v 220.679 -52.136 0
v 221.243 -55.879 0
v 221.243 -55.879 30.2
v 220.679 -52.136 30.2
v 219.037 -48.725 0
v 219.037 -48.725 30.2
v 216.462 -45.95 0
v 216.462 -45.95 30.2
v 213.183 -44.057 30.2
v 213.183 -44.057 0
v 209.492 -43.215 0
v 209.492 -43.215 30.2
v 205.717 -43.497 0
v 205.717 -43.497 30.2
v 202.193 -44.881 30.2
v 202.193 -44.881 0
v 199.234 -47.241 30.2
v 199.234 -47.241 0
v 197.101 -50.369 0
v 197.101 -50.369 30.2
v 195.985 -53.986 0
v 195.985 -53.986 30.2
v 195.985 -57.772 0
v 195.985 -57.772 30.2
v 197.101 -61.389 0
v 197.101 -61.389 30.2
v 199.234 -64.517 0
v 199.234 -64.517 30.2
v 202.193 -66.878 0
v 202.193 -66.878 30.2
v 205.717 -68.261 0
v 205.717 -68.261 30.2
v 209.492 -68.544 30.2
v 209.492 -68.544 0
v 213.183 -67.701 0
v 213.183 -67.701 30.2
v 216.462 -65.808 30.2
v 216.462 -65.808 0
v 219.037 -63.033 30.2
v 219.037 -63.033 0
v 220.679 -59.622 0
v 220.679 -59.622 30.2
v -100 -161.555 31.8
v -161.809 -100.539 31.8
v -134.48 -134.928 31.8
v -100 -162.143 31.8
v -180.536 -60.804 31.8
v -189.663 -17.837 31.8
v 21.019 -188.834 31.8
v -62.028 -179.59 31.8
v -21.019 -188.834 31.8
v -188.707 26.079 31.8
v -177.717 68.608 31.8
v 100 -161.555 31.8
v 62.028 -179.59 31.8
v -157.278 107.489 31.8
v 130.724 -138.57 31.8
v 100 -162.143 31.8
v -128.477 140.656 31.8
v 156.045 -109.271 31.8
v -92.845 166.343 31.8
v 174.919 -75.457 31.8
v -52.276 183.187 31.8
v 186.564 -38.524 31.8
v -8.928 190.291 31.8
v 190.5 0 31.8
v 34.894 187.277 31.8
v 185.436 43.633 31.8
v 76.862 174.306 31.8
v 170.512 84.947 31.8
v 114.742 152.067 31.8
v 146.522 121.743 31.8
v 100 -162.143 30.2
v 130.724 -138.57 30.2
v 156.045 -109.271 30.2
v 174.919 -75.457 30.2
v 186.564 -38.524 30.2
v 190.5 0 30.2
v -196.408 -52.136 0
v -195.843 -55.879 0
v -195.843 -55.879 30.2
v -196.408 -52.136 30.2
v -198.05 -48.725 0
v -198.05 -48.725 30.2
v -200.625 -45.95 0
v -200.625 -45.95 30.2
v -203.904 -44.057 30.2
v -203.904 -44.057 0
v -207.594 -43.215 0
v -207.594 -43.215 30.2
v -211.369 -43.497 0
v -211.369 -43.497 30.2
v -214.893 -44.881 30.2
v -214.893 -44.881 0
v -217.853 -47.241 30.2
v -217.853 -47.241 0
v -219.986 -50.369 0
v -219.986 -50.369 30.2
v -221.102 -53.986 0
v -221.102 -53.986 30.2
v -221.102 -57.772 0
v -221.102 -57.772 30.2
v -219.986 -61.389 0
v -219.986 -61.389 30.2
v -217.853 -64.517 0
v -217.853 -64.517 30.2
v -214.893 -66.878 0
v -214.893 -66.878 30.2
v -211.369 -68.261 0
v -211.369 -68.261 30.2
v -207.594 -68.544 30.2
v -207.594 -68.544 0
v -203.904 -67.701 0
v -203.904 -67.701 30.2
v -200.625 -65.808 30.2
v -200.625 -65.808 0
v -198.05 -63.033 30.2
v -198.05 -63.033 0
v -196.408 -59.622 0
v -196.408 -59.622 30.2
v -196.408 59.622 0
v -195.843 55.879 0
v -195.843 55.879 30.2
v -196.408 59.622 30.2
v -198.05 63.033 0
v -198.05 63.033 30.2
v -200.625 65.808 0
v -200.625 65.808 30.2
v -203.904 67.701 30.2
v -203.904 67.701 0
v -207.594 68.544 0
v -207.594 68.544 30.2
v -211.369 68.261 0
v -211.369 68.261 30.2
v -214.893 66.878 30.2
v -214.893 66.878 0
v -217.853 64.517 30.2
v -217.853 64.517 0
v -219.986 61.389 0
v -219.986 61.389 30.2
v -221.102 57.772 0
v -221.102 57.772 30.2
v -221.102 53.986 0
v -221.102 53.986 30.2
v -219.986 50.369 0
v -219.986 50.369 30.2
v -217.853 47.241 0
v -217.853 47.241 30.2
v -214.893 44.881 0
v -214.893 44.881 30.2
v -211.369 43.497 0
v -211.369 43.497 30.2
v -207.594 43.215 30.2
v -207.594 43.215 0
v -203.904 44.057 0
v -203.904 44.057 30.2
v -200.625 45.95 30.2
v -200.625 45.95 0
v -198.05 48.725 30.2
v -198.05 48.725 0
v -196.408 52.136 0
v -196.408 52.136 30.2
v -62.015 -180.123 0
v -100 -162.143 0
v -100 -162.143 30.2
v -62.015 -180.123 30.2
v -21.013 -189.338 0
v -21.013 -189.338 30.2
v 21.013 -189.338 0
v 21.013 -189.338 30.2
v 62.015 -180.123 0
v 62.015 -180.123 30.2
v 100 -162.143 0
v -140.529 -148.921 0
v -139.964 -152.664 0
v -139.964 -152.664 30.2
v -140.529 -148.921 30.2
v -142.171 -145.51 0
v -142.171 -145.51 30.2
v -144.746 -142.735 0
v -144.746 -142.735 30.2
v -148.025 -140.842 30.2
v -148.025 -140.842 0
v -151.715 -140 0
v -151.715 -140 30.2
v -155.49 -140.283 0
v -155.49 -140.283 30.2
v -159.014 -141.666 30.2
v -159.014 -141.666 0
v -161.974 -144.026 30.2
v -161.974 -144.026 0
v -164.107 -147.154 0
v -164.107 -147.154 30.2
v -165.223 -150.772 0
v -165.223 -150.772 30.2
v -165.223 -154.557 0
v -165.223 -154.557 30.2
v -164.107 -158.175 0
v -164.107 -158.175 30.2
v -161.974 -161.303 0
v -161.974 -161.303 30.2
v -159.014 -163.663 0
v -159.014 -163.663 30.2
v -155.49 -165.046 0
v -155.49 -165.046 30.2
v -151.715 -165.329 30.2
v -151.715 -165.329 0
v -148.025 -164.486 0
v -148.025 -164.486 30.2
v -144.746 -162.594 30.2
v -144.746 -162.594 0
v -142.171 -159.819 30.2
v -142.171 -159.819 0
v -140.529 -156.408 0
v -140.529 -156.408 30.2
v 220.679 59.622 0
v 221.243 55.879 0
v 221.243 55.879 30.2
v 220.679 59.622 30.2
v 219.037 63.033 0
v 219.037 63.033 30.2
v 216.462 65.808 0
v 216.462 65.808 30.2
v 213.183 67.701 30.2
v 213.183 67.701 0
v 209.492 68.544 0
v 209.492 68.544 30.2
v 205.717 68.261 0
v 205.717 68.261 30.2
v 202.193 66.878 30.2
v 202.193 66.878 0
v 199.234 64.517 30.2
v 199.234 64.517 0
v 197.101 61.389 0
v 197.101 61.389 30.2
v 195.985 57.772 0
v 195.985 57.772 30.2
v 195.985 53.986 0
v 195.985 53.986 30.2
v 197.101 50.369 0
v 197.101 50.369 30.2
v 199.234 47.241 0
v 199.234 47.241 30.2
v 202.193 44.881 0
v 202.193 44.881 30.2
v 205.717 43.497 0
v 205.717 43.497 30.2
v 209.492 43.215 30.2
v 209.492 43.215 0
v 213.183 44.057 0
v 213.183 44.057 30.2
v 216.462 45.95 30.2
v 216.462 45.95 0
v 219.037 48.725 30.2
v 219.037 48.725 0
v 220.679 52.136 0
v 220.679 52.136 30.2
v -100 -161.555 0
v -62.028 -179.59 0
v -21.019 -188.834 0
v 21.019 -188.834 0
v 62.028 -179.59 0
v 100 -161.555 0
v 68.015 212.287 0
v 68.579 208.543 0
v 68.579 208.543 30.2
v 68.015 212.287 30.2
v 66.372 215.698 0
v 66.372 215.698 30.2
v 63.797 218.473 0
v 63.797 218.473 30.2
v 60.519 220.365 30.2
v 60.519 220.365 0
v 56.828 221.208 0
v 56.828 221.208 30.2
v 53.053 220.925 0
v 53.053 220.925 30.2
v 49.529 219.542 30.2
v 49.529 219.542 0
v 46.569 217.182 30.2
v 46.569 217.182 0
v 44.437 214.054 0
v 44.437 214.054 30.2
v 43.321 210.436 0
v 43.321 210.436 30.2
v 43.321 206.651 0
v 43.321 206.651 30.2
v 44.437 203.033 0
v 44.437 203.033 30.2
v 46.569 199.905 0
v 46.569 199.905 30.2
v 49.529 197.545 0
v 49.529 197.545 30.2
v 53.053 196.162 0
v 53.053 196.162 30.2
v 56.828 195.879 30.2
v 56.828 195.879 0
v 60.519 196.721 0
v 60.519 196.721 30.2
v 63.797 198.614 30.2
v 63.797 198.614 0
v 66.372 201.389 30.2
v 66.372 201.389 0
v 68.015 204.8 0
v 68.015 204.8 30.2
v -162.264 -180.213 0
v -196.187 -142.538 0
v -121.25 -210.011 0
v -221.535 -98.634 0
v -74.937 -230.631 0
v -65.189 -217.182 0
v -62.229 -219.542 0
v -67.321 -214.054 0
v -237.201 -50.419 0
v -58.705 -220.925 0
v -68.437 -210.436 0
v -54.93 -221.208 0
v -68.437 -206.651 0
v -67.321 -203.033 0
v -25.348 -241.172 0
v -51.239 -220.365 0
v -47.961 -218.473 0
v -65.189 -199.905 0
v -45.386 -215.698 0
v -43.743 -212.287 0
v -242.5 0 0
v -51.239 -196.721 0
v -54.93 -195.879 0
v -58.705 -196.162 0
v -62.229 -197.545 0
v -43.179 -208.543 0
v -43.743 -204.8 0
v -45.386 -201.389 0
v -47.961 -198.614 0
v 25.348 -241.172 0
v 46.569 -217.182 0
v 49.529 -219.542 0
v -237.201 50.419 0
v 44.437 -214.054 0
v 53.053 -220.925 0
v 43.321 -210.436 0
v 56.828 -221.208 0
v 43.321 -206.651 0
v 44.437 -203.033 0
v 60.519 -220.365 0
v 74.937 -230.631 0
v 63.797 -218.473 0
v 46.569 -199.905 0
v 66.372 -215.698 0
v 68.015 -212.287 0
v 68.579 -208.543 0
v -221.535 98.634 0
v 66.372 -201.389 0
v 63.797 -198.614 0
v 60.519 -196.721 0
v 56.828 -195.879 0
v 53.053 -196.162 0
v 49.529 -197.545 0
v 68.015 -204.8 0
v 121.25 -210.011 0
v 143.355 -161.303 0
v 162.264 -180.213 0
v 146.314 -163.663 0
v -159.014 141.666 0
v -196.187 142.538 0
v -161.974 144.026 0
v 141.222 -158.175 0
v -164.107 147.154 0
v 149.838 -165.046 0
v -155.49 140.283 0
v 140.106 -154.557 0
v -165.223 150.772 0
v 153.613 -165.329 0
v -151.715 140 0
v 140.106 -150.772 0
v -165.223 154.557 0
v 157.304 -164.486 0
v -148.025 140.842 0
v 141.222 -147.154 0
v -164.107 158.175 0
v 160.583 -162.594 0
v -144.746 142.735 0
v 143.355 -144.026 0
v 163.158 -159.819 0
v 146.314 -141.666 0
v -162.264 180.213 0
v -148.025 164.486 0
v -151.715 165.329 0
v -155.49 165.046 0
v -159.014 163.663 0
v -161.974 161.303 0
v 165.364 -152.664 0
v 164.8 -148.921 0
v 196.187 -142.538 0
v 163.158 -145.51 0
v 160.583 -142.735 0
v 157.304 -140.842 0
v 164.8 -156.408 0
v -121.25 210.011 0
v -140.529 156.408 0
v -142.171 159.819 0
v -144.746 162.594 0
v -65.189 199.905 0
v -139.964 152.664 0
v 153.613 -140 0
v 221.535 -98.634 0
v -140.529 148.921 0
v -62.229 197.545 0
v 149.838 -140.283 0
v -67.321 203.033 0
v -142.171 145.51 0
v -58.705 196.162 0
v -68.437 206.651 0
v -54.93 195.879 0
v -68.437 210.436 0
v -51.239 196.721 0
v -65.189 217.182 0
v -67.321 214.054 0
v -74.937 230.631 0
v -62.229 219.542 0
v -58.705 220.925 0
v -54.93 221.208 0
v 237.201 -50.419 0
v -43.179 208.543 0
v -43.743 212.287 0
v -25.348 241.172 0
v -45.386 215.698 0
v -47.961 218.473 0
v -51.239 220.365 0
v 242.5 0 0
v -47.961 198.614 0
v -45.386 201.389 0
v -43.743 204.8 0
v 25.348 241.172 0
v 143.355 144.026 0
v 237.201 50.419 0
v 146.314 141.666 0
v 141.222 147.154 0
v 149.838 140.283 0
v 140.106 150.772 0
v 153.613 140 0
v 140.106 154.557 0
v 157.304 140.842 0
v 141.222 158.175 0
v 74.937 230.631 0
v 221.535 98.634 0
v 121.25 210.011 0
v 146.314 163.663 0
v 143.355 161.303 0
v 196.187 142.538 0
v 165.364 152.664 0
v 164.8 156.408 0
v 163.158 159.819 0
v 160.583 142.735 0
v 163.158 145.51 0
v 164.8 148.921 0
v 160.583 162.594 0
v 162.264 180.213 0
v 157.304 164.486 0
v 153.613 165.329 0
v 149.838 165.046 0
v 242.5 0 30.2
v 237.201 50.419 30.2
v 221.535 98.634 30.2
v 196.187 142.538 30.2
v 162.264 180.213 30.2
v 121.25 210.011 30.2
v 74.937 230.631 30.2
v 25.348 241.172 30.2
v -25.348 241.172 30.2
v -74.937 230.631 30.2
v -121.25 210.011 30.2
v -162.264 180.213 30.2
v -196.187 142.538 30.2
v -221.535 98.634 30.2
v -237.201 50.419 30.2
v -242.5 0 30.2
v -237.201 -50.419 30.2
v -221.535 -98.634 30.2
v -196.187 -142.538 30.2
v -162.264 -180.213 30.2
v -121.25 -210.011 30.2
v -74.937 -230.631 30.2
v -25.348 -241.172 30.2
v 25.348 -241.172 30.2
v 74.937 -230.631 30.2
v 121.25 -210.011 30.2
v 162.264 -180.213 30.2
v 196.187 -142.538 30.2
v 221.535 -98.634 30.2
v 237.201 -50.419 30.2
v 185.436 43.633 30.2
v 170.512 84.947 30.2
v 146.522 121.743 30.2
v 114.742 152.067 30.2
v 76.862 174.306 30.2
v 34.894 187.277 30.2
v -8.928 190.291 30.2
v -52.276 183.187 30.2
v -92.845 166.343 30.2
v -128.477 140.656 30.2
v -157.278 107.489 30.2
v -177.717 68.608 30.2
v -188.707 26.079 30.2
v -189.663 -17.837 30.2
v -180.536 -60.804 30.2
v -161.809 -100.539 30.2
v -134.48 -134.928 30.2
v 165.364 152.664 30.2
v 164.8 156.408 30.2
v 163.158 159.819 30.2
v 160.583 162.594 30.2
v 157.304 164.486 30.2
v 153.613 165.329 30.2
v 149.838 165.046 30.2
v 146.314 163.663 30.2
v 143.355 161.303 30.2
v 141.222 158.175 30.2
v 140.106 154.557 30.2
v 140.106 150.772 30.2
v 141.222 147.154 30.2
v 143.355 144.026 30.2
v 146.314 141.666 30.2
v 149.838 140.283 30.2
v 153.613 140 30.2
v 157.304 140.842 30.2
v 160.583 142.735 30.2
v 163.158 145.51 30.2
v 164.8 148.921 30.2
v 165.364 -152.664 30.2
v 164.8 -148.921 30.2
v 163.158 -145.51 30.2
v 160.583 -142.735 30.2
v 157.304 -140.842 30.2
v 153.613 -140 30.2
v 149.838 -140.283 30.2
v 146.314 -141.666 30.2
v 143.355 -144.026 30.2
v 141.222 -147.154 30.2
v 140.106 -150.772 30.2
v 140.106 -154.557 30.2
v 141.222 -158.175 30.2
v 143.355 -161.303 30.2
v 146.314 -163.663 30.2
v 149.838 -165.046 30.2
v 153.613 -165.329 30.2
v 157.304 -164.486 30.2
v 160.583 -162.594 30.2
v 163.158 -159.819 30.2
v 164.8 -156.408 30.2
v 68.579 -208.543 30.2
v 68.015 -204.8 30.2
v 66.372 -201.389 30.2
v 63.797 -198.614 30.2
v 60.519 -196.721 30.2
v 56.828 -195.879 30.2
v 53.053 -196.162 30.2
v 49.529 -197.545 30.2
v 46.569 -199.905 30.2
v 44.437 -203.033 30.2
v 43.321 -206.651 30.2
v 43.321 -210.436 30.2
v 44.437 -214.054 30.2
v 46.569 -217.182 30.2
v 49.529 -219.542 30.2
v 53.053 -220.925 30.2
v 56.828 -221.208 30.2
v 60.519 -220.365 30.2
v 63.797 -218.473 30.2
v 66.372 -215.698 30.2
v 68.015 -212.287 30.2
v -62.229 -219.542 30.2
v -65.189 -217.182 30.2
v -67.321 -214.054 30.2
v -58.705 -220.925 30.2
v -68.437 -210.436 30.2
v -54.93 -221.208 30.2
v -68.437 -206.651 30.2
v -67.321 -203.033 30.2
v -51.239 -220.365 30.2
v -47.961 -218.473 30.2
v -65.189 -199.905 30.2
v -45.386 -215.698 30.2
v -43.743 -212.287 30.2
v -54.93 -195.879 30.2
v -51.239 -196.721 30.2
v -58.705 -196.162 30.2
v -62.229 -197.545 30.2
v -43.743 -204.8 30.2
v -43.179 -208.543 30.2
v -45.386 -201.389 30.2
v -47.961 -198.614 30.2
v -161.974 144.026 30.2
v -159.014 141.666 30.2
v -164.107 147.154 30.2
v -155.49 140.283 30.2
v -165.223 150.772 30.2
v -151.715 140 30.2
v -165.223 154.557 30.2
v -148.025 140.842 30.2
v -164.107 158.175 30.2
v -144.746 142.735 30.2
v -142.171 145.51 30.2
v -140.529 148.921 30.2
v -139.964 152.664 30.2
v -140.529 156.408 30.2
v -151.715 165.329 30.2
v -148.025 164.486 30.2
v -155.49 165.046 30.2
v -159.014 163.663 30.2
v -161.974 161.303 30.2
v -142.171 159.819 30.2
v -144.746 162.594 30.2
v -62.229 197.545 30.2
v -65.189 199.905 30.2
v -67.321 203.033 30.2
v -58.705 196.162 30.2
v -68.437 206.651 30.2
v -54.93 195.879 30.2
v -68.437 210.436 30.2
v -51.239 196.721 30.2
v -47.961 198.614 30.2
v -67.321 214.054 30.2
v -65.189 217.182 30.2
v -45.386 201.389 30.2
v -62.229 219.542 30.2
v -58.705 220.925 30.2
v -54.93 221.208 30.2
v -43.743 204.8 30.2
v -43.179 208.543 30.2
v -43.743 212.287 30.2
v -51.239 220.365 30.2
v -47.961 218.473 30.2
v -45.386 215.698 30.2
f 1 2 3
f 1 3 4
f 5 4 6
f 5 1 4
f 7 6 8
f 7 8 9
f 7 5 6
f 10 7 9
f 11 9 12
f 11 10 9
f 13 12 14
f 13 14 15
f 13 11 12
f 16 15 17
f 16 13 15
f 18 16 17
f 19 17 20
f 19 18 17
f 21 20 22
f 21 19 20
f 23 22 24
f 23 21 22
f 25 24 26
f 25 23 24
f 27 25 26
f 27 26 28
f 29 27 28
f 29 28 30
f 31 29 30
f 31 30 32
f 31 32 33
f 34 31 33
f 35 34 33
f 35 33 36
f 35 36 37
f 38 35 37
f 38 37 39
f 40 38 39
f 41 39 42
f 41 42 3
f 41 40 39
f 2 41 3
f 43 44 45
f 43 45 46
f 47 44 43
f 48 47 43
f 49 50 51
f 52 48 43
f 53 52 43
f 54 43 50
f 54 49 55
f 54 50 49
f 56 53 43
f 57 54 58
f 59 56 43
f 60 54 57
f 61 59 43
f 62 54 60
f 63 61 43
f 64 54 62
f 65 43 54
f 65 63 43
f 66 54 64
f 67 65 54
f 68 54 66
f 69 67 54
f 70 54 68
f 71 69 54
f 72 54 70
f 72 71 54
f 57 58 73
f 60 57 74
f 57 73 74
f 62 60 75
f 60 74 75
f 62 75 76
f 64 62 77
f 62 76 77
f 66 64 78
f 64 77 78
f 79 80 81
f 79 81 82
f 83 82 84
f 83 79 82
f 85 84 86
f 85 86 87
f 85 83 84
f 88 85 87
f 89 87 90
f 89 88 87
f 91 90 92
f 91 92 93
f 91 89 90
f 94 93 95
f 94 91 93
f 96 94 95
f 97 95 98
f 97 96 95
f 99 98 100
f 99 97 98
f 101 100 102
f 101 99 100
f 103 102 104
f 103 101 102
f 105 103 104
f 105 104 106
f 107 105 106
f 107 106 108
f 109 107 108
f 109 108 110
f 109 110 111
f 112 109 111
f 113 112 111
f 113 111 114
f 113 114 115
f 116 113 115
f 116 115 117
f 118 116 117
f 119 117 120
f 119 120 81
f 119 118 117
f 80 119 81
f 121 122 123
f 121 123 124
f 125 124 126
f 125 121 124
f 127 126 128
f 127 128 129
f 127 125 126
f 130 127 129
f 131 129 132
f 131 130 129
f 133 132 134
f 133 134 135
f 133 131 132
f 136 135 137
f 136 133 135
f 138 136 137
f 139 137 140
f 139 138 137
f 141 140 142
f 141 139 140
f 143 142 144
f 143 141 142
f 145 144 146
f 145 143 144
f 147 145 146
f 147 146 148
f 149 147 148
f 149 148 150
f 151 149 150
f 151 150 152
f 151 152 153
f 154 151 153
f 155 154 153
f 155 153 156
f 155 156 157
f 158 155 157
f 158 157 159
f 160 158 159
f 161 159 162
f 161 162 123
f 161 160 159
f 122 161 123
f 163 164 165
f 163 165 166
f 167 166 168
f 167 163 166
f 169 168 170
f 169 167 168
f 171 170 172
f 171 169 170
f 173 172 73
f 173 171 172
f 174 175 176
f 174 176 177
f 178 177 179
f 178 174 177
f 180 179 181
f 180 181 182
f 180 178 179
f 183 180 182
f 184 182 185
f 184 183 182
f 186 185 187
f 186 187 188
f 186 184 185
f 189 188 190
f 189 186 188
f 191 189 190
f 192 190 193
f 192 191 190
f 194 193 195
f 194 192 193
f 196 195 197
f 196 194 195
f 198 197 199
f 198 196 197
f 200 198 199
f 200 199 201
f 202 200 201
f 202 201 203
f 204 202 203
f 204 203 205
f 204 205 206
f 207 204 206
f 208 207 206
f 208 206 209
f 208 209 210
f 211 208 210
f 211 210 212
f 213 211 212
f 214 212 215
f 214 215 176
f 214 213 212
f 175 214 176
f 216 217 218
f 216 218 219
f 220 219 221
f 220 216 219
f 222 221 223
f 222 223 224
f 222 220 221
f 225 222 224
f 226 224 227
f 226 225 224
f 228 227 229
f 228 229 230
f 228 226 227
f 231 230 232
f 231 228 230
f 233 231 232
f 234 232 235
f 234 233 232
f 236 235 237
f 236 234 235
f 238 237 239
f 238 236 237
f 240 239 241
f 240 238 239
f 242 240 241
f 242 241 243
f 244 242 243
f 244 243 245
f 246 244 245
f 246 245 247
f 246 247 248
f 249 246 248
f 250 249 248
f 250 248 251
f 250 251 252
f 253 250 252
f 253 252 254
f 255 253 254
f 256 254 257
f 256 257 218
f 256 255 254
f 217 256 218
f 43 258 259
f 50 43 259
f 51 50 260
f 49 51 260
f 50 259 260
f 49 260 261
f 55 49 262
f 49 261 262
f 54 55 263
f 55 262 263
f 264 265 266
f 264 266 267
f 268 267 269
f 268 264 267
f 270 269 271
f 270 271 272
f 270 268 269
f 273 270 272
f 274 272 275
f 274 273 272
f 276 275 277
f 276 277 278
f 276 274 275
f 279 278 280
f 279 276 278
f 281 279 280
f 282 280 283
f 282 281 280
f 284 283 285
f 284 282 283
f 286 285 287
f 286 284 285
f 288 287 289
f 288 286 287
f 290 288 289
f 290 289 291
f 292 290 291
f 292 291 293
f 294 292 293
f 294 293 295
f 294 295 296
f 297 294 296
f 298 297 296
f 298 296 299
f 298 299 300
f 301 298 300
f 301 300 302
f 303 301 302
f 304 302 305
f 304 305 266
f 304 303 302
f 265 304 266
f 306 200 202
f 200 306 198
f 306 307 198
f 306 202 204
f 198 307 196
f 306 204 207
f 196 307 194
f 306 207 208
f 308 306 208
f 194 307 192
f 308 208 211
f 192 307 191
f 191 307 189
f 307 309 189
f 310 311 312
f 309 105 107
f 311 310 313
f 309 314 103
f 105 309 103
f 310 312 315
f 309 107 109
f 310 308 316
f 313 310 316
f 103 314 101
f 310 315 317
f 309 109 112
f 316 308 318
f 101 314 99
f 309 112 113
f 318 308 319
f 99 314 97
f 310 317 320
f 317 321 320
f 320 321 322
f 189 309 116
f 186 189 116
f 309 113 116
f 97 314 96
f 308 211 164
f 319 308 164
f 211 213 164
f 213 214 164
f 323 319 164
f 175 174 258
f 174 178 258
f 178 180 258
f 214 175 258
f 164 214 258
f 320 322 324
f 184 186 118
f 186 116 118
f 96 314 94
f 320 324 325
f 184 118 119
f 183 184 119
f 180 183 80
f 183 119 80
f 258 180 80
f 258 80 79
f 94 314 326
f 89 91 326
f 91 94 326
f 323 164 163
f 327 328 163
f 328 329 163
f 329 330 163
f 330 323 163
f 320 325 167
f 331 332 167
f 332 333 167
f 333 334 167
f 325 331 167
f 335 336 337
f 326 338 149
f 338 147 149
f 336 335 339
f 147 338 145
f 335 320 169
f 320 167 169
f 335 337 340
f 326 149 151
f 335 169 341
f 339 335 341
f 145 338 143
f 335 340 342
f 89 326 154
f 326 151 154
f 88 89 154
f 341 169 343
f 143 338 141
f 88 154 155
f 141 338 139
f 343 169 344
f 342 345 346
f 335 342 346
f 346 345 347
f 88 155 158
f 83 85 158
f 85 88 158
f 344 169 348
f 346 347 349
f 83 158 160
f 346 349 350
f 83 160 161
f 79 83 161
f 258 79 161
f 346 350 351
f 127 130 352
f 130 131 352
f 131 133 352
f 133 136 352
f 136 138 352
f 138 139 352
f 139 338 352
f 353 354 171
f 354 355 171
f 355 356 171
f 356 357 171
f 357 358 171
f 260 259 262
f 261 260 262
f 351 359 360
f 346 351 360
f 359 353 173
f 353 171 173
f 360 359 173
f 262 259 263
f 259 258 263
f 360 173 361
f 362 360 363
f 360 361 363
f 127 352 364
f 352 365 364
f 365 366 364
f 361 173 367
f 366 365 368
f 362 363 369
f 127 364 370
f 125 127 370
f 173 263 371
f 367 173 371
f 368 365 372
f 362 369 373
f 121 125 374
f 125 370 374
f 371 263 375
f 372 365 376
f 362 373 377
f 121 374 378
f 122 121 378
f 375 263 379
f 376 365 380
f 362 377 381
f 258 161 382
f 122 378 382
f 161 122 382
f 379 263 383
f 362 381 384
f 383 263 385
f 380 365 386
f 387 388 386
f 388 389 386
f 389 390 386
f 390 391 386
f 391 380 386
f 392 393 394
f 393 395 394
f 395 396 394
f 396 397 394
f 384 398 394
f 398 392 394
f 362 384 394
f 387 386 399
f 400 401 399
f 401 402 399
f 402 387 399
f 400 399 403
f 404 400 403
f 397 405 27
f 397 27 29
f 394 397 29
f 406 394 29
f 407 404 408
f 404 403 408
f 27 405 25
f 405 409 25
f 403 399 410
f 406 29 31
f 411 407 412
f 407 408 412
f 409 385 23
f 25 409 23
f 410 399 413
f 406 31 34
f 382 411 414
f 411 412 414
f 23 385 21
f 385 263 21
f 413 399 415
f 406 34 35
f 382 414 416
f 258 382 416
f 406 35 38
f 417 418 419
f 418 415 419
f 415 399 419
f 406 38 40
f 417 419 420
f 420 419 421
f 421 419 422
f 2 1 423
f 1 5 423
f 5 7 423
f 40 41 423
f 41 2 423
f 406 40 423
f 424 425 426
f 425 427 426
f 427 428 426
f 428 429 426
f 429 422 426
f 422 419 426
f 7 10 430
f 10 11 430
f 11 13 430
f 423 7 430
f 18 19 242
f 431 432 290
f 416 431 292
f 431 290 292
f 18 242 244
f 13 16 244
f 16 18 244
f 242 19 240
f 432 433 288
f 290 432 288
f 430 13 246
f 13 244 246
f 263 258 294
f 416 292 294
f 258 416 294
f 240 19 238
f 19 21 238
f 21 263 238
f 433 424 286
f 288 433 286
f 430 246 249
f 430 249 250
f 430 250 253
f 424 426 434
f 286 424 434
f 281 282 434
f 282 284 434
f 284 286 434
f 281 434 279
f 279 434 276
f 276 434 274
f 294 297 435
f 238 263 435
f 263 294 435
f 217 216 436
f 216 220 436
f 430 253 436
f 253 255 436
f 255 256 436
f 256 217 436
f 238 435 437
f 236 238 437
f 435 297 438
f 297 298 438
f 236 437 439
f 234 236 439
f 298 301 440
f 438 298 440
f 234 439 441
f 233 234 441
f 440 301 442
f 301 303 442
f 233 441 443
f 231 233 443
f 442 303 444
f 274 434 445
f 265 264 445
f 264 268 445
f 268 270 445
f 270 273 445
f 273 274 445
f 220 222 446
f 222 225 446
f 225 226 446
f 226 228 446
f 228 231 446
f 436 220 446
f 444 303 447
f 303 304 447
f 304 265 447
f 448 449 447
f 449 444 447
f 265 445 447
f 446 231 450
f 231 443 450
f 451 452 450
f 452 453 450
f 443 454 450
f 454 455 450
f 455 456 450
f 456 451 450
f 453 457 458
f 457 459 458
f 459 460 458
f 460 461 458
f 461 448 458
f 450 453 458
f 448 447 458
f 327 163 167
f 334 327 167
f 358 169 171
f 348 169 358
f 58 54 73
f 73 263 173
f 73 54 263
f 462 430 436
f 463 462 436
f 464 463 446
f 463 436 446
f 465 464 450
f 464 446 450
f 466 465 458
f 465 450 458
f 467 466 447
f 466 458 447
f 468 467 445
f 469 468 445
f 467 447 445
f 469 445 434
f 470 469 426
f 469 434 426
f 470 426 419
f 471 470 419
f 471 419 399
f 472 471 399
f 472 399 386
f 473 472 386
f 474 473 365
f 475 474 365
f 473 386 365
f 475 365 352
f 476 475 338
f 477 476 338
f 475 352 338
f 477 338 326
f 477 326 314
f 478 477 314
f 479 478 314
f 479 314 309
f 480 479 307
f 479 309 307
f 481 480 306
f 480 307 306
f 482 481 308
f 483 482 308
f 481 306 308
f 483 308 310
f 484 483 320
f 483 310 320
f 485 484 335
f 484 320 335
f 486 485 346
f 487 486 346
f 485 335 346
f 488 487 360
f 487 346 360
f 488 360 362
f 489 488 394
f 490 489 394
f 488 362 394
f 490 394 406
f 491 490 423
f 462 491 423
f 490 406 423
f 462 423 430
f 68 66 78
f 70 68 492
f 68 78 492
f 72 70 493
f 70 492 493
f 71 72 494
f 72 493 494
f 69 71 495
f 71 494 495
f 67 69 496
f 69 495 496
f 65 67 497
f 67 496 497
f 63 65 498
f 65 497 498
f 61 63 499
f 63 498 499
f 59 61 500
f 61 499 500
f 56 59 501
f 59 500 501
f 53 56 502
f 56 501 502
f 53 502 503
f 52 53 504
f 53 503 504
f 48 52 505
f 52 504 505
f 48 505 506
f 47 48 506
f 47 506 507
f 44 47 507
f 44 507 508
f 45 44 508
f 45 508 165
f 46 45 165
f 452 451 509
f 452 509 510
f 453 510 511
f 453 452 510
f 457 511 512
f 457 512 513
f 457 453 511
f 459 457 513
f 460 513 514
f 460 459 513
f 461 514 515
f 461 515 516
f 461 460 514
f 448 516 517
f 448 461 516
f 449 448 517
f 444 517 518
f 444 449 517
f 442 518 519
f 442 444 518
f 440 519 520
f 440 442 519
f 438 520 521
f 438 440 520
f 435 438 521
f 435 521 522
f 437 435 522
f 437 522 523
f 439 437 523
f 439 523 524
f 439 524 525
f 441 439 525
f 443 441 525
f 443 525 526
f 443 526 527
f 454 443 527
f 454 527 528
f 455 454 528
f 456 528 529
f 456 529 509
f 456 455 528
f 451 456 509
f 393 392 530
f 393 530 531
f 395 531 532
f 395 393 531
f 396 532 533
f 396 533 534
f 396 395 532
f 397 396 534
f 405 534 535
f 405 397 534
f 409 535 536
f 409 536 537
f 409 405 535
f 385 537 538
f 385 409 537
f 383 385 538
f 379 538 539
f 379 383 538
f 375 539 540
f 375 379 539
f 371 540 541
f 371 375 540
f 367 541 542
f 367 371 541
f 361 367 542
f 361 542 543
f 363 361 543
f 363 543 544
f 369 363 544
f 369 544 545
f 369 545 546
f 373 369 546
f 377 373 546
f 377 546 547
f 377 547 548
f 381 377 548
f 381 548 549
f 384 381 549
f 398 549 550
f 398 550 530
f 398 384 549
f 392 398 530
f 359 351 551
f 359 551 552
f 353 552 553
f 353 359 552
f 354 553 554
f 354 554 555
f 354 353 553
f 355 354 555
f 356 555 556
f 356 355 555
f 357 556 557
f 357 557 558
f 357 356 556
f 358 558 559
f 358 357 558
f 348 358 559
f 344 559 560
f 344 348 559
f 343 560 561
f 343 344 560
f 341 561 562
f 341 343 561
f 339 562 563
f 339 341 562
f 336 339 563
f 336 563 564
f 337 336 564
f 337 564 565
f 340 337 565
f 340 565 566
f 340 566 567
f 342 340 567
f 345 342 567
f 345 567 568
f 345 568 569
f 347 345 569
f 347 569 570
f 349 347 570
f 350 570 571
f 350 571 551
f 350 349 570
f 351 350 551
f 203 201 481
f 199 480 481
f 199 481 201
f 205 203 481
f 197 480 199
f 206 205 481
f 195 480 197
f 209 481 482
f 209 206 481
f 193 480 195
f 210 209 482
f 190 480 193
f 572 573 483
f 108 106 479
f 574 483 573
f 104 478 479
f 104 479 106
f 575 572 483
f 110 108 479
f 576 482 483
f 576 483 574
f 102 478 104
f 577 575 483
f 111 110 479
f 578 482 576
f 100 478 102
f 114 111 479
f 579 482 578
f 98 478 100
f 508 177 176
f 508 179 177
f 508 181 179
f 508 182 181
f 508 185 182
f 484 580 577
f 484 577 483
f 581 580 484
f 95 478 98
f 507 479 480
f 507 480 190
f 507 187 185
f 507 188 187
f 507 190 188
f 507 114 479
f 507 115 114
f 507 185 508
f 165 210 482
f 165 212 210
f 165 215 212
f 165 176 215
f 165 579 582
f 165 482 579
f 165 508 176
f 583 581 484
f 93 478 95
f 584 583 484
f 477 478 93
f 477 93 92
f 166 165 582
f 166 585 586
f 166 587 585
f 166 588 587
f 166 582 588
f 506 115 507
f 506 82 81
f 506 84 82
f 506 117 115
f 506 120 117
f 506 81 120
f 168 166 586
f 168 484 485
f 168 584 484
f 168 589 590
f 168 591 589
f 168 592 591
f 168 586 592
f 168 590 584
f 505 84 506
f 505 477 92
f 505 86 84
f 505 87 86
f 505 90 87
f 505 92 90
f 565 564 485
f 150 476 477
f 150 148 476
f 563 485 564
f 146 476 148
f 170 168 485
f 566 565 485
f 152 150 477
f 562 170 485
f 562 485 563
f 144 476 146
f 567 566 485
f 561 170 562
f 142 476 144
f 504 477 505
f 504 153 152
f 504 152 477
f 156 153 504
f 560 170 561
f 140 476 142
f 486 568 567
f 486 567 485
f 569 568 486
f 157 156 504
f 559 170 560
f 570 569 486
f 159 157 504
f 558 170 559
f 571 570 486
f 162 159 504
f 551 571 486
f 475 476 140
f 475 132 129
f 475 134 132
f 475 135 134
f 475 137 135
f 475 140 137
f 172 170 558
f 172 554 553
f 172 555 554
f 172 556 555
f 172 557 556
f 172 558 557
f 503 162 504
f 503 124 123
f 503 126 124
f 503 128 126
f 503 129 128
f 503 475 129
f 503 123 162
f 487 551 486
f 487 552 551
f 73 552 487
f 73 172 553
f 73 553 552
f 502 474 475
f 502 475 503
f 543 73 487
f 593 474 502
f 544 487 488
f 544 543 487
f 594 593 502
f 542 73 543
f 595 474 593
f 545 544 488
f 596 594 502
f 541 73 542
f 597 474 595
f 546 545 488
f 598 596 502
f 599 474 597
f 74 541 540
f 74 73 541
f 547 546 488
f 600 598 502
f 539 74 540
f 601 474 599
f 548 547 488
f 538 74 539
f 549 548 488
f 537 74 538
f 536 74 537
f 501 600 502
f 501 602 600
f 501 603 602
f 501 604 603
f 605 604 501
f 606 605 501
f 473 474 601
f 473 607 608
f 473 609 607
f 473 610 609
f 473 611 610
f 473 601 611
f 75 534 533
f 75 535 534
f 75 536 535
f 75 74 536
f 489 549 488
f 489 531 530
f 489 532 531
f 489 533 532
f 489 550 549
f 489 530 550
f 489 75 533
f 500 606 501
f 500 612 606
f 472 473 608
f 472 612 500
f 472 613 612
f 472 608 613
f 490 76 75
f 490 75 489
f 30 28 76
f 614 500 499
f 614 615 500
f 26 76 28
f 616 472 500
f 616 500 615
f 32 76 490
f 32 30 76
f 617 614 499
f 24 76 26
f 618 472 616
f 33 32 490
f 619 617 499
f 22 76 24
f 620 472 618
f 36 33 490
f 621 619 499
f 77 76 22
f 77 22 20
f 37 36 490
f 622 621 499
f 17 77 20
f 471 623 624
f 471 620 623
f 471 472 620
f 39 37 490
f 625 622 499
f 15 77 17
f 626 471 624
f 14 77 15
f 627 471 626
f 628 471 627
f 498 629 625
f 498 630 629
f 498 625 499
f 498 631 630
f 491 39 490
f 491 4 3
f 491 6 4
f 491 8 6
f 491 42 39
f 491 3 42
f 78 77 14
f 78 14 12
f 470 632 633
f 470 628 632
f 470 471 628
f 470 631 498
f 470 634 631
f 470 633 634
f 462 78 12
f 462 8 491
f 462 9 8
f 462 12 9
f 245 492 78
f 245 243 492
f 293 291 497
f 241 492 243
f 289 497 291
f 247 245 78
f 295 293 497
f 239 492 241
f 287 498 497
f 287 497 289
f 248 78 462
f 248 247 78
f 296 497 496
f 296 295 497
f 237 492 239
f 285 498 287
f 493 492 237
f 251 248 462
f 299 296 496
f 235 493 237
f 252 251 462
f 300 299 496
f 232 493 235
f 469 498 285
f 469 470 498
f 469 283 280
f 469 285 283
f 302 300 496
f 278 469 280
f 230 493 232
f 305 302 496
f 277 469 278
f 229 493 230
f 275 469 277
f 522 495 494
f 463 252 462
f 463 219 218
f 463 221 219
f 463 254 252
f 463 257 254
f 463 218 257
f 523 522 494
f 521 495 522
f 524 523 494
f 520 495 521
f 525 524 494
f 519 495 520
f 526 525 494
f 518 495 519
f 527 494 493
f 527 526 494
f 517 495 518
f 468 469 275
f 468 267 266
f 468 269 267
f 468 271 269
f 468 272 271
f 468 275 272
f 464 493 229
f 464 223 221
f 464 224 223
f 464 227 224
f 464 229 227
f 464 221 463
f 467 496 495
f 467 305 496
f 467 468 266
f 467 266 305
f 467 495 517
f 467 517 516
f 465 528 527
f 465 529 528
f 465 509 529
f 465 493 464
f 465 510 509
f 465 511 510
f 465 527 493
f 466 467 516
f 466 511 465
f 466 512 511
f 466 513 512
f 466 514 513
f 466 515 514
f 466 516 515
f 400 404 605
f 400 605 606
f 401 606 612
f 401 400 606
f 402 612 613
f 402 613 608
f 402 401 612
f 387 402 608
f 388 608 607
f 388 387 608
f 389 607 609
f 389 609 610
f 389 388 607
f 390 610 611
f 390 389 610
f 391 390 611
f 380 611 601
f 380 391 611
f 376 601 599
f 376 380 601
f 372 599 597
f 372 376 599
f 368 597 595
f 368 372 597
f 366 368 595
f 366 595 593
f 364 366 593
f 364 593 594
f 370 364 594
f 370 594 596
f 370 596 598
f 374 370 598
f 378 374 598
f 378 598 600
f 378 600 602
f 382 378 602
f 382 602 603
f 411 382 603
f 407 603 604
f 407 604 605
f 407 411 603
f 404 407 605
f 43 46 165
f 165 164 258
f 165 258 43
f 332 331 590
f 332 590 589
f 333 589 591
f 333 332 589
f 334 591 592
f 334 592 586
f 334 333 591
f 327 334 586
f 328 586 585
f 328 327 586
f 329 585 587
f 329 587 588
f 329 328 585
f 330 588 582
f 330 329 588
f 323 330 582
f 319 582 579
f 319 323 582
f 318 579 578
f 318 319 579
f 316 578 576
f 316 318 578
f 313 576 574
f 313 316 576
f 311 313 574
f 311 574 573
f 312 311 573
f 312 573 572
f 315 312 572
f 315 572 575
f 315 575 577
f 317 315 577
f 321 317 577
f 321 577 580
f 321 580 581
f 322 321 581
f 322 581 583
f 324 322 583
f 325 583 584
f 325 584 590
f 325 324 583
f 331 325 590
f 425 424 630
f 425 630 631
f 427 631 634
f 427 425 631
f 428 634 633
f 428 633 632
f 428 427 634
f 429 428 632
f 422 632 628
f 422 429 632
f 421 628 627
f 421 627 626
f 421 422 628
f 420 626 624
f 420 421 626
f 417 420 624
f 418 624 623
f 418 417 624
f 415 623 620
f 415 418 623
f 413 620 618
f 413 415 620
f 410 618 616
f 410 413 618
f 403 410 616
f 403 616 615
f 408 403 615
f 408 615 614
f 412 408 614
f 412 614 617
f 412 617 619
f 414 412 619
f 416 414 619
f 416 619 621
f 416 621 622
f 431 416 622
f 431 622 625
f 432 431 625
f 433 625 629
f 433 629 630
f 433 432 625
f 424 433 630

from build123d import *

# Parameters (mm, degrees)
F2_R     = 242.5
F2_R_2   = 12.7
F2_R_3   = 190.5
F4_DEPTH = 30.2
F5_DEPTH = 31.8


with BuildPart() as f4:
    # F2 (on Top) → F4 (new body)
    with BuildSketch(Plane.XY):
        Circle(F2_R)
        with Locations((-152.6643540582, -152.6643540582)):
            Circle(F2_R_2, mode=Mode.SUBTRACT)
        with Locations((-55.8790318376, -208.5433858958)):
            Circle(F2_R_2, mode=Mode.SUBTRACT)
        with Locations((-208.5433858958, -55.8790318376)):
            Circle(F2_R_2, mode=Mode.SUBTRACT)
        with Locations((55.8790318376, -208.5433858958)):
            Circle(F2_R_2, mode=Mode.SUBTRACT)
        with Locations((152.6643540582, -152.6643540582)):
            Circle(F2_R_2, mode=Mode.SUBTRACT)
        with Locations((208.5433858958, -55.8790318376)):
            Circle(F2_R_2, mode=Mode.SUBTRACT)
        with Locations((-208.5433858958, 55.8790318376)):
            Circle(F2_R_2, mode=Mode.SUBTRACT)
        with Locations((-152.6643540582, 152.6643540582)):
            Circle(F2_R_2, mode=Mode.SUBTRACT)
        with Locations((-55.8790318376, 208.5433858958)):
            Circle(F2_R_2, mode=Mode.SUBTRACT)
        Circle(F2_R_3, mode=Mode.SUBTRACT)
        with Locations((208.5433858958, 55.8790318376)):
            Circle(F2_R_2, mode=Mode.SUBTRACT)
        with Locations((55.8790318376, 208.5433858958)):
            Circle(F2_R_2, mode=Mode.SUBTRACT)
        with Locations((152.6643540582, 152.6643540582)):
            Circle(F2_R_2, mode=Mode.SUBTRACT)
    extrude(amount=F4_DEPTH)

    # F3 (on face) → F5 (join)
    with BuildSketch(Plane.XY):
        with BuildLine():
            Line((-100, -162.1426840779), (-100, -161.554944214))
            ThreePointArc((-100, -161.554944214), (0, -190), (100, -161.554944214))
            Line((100, -161.554944214), (100, -162.1426840779))
            ThreePointArc((100, -162.1426840779), (166.3433948193, -92.8446282776), (190.5, 0))
            ThreePointArc((190.5, 0), (-92.8446282776, 166.3433948193), (-100, -162.1426840779))
        make_face()
    extrude(amount=F5_DEPTH)


solid = f4.part
